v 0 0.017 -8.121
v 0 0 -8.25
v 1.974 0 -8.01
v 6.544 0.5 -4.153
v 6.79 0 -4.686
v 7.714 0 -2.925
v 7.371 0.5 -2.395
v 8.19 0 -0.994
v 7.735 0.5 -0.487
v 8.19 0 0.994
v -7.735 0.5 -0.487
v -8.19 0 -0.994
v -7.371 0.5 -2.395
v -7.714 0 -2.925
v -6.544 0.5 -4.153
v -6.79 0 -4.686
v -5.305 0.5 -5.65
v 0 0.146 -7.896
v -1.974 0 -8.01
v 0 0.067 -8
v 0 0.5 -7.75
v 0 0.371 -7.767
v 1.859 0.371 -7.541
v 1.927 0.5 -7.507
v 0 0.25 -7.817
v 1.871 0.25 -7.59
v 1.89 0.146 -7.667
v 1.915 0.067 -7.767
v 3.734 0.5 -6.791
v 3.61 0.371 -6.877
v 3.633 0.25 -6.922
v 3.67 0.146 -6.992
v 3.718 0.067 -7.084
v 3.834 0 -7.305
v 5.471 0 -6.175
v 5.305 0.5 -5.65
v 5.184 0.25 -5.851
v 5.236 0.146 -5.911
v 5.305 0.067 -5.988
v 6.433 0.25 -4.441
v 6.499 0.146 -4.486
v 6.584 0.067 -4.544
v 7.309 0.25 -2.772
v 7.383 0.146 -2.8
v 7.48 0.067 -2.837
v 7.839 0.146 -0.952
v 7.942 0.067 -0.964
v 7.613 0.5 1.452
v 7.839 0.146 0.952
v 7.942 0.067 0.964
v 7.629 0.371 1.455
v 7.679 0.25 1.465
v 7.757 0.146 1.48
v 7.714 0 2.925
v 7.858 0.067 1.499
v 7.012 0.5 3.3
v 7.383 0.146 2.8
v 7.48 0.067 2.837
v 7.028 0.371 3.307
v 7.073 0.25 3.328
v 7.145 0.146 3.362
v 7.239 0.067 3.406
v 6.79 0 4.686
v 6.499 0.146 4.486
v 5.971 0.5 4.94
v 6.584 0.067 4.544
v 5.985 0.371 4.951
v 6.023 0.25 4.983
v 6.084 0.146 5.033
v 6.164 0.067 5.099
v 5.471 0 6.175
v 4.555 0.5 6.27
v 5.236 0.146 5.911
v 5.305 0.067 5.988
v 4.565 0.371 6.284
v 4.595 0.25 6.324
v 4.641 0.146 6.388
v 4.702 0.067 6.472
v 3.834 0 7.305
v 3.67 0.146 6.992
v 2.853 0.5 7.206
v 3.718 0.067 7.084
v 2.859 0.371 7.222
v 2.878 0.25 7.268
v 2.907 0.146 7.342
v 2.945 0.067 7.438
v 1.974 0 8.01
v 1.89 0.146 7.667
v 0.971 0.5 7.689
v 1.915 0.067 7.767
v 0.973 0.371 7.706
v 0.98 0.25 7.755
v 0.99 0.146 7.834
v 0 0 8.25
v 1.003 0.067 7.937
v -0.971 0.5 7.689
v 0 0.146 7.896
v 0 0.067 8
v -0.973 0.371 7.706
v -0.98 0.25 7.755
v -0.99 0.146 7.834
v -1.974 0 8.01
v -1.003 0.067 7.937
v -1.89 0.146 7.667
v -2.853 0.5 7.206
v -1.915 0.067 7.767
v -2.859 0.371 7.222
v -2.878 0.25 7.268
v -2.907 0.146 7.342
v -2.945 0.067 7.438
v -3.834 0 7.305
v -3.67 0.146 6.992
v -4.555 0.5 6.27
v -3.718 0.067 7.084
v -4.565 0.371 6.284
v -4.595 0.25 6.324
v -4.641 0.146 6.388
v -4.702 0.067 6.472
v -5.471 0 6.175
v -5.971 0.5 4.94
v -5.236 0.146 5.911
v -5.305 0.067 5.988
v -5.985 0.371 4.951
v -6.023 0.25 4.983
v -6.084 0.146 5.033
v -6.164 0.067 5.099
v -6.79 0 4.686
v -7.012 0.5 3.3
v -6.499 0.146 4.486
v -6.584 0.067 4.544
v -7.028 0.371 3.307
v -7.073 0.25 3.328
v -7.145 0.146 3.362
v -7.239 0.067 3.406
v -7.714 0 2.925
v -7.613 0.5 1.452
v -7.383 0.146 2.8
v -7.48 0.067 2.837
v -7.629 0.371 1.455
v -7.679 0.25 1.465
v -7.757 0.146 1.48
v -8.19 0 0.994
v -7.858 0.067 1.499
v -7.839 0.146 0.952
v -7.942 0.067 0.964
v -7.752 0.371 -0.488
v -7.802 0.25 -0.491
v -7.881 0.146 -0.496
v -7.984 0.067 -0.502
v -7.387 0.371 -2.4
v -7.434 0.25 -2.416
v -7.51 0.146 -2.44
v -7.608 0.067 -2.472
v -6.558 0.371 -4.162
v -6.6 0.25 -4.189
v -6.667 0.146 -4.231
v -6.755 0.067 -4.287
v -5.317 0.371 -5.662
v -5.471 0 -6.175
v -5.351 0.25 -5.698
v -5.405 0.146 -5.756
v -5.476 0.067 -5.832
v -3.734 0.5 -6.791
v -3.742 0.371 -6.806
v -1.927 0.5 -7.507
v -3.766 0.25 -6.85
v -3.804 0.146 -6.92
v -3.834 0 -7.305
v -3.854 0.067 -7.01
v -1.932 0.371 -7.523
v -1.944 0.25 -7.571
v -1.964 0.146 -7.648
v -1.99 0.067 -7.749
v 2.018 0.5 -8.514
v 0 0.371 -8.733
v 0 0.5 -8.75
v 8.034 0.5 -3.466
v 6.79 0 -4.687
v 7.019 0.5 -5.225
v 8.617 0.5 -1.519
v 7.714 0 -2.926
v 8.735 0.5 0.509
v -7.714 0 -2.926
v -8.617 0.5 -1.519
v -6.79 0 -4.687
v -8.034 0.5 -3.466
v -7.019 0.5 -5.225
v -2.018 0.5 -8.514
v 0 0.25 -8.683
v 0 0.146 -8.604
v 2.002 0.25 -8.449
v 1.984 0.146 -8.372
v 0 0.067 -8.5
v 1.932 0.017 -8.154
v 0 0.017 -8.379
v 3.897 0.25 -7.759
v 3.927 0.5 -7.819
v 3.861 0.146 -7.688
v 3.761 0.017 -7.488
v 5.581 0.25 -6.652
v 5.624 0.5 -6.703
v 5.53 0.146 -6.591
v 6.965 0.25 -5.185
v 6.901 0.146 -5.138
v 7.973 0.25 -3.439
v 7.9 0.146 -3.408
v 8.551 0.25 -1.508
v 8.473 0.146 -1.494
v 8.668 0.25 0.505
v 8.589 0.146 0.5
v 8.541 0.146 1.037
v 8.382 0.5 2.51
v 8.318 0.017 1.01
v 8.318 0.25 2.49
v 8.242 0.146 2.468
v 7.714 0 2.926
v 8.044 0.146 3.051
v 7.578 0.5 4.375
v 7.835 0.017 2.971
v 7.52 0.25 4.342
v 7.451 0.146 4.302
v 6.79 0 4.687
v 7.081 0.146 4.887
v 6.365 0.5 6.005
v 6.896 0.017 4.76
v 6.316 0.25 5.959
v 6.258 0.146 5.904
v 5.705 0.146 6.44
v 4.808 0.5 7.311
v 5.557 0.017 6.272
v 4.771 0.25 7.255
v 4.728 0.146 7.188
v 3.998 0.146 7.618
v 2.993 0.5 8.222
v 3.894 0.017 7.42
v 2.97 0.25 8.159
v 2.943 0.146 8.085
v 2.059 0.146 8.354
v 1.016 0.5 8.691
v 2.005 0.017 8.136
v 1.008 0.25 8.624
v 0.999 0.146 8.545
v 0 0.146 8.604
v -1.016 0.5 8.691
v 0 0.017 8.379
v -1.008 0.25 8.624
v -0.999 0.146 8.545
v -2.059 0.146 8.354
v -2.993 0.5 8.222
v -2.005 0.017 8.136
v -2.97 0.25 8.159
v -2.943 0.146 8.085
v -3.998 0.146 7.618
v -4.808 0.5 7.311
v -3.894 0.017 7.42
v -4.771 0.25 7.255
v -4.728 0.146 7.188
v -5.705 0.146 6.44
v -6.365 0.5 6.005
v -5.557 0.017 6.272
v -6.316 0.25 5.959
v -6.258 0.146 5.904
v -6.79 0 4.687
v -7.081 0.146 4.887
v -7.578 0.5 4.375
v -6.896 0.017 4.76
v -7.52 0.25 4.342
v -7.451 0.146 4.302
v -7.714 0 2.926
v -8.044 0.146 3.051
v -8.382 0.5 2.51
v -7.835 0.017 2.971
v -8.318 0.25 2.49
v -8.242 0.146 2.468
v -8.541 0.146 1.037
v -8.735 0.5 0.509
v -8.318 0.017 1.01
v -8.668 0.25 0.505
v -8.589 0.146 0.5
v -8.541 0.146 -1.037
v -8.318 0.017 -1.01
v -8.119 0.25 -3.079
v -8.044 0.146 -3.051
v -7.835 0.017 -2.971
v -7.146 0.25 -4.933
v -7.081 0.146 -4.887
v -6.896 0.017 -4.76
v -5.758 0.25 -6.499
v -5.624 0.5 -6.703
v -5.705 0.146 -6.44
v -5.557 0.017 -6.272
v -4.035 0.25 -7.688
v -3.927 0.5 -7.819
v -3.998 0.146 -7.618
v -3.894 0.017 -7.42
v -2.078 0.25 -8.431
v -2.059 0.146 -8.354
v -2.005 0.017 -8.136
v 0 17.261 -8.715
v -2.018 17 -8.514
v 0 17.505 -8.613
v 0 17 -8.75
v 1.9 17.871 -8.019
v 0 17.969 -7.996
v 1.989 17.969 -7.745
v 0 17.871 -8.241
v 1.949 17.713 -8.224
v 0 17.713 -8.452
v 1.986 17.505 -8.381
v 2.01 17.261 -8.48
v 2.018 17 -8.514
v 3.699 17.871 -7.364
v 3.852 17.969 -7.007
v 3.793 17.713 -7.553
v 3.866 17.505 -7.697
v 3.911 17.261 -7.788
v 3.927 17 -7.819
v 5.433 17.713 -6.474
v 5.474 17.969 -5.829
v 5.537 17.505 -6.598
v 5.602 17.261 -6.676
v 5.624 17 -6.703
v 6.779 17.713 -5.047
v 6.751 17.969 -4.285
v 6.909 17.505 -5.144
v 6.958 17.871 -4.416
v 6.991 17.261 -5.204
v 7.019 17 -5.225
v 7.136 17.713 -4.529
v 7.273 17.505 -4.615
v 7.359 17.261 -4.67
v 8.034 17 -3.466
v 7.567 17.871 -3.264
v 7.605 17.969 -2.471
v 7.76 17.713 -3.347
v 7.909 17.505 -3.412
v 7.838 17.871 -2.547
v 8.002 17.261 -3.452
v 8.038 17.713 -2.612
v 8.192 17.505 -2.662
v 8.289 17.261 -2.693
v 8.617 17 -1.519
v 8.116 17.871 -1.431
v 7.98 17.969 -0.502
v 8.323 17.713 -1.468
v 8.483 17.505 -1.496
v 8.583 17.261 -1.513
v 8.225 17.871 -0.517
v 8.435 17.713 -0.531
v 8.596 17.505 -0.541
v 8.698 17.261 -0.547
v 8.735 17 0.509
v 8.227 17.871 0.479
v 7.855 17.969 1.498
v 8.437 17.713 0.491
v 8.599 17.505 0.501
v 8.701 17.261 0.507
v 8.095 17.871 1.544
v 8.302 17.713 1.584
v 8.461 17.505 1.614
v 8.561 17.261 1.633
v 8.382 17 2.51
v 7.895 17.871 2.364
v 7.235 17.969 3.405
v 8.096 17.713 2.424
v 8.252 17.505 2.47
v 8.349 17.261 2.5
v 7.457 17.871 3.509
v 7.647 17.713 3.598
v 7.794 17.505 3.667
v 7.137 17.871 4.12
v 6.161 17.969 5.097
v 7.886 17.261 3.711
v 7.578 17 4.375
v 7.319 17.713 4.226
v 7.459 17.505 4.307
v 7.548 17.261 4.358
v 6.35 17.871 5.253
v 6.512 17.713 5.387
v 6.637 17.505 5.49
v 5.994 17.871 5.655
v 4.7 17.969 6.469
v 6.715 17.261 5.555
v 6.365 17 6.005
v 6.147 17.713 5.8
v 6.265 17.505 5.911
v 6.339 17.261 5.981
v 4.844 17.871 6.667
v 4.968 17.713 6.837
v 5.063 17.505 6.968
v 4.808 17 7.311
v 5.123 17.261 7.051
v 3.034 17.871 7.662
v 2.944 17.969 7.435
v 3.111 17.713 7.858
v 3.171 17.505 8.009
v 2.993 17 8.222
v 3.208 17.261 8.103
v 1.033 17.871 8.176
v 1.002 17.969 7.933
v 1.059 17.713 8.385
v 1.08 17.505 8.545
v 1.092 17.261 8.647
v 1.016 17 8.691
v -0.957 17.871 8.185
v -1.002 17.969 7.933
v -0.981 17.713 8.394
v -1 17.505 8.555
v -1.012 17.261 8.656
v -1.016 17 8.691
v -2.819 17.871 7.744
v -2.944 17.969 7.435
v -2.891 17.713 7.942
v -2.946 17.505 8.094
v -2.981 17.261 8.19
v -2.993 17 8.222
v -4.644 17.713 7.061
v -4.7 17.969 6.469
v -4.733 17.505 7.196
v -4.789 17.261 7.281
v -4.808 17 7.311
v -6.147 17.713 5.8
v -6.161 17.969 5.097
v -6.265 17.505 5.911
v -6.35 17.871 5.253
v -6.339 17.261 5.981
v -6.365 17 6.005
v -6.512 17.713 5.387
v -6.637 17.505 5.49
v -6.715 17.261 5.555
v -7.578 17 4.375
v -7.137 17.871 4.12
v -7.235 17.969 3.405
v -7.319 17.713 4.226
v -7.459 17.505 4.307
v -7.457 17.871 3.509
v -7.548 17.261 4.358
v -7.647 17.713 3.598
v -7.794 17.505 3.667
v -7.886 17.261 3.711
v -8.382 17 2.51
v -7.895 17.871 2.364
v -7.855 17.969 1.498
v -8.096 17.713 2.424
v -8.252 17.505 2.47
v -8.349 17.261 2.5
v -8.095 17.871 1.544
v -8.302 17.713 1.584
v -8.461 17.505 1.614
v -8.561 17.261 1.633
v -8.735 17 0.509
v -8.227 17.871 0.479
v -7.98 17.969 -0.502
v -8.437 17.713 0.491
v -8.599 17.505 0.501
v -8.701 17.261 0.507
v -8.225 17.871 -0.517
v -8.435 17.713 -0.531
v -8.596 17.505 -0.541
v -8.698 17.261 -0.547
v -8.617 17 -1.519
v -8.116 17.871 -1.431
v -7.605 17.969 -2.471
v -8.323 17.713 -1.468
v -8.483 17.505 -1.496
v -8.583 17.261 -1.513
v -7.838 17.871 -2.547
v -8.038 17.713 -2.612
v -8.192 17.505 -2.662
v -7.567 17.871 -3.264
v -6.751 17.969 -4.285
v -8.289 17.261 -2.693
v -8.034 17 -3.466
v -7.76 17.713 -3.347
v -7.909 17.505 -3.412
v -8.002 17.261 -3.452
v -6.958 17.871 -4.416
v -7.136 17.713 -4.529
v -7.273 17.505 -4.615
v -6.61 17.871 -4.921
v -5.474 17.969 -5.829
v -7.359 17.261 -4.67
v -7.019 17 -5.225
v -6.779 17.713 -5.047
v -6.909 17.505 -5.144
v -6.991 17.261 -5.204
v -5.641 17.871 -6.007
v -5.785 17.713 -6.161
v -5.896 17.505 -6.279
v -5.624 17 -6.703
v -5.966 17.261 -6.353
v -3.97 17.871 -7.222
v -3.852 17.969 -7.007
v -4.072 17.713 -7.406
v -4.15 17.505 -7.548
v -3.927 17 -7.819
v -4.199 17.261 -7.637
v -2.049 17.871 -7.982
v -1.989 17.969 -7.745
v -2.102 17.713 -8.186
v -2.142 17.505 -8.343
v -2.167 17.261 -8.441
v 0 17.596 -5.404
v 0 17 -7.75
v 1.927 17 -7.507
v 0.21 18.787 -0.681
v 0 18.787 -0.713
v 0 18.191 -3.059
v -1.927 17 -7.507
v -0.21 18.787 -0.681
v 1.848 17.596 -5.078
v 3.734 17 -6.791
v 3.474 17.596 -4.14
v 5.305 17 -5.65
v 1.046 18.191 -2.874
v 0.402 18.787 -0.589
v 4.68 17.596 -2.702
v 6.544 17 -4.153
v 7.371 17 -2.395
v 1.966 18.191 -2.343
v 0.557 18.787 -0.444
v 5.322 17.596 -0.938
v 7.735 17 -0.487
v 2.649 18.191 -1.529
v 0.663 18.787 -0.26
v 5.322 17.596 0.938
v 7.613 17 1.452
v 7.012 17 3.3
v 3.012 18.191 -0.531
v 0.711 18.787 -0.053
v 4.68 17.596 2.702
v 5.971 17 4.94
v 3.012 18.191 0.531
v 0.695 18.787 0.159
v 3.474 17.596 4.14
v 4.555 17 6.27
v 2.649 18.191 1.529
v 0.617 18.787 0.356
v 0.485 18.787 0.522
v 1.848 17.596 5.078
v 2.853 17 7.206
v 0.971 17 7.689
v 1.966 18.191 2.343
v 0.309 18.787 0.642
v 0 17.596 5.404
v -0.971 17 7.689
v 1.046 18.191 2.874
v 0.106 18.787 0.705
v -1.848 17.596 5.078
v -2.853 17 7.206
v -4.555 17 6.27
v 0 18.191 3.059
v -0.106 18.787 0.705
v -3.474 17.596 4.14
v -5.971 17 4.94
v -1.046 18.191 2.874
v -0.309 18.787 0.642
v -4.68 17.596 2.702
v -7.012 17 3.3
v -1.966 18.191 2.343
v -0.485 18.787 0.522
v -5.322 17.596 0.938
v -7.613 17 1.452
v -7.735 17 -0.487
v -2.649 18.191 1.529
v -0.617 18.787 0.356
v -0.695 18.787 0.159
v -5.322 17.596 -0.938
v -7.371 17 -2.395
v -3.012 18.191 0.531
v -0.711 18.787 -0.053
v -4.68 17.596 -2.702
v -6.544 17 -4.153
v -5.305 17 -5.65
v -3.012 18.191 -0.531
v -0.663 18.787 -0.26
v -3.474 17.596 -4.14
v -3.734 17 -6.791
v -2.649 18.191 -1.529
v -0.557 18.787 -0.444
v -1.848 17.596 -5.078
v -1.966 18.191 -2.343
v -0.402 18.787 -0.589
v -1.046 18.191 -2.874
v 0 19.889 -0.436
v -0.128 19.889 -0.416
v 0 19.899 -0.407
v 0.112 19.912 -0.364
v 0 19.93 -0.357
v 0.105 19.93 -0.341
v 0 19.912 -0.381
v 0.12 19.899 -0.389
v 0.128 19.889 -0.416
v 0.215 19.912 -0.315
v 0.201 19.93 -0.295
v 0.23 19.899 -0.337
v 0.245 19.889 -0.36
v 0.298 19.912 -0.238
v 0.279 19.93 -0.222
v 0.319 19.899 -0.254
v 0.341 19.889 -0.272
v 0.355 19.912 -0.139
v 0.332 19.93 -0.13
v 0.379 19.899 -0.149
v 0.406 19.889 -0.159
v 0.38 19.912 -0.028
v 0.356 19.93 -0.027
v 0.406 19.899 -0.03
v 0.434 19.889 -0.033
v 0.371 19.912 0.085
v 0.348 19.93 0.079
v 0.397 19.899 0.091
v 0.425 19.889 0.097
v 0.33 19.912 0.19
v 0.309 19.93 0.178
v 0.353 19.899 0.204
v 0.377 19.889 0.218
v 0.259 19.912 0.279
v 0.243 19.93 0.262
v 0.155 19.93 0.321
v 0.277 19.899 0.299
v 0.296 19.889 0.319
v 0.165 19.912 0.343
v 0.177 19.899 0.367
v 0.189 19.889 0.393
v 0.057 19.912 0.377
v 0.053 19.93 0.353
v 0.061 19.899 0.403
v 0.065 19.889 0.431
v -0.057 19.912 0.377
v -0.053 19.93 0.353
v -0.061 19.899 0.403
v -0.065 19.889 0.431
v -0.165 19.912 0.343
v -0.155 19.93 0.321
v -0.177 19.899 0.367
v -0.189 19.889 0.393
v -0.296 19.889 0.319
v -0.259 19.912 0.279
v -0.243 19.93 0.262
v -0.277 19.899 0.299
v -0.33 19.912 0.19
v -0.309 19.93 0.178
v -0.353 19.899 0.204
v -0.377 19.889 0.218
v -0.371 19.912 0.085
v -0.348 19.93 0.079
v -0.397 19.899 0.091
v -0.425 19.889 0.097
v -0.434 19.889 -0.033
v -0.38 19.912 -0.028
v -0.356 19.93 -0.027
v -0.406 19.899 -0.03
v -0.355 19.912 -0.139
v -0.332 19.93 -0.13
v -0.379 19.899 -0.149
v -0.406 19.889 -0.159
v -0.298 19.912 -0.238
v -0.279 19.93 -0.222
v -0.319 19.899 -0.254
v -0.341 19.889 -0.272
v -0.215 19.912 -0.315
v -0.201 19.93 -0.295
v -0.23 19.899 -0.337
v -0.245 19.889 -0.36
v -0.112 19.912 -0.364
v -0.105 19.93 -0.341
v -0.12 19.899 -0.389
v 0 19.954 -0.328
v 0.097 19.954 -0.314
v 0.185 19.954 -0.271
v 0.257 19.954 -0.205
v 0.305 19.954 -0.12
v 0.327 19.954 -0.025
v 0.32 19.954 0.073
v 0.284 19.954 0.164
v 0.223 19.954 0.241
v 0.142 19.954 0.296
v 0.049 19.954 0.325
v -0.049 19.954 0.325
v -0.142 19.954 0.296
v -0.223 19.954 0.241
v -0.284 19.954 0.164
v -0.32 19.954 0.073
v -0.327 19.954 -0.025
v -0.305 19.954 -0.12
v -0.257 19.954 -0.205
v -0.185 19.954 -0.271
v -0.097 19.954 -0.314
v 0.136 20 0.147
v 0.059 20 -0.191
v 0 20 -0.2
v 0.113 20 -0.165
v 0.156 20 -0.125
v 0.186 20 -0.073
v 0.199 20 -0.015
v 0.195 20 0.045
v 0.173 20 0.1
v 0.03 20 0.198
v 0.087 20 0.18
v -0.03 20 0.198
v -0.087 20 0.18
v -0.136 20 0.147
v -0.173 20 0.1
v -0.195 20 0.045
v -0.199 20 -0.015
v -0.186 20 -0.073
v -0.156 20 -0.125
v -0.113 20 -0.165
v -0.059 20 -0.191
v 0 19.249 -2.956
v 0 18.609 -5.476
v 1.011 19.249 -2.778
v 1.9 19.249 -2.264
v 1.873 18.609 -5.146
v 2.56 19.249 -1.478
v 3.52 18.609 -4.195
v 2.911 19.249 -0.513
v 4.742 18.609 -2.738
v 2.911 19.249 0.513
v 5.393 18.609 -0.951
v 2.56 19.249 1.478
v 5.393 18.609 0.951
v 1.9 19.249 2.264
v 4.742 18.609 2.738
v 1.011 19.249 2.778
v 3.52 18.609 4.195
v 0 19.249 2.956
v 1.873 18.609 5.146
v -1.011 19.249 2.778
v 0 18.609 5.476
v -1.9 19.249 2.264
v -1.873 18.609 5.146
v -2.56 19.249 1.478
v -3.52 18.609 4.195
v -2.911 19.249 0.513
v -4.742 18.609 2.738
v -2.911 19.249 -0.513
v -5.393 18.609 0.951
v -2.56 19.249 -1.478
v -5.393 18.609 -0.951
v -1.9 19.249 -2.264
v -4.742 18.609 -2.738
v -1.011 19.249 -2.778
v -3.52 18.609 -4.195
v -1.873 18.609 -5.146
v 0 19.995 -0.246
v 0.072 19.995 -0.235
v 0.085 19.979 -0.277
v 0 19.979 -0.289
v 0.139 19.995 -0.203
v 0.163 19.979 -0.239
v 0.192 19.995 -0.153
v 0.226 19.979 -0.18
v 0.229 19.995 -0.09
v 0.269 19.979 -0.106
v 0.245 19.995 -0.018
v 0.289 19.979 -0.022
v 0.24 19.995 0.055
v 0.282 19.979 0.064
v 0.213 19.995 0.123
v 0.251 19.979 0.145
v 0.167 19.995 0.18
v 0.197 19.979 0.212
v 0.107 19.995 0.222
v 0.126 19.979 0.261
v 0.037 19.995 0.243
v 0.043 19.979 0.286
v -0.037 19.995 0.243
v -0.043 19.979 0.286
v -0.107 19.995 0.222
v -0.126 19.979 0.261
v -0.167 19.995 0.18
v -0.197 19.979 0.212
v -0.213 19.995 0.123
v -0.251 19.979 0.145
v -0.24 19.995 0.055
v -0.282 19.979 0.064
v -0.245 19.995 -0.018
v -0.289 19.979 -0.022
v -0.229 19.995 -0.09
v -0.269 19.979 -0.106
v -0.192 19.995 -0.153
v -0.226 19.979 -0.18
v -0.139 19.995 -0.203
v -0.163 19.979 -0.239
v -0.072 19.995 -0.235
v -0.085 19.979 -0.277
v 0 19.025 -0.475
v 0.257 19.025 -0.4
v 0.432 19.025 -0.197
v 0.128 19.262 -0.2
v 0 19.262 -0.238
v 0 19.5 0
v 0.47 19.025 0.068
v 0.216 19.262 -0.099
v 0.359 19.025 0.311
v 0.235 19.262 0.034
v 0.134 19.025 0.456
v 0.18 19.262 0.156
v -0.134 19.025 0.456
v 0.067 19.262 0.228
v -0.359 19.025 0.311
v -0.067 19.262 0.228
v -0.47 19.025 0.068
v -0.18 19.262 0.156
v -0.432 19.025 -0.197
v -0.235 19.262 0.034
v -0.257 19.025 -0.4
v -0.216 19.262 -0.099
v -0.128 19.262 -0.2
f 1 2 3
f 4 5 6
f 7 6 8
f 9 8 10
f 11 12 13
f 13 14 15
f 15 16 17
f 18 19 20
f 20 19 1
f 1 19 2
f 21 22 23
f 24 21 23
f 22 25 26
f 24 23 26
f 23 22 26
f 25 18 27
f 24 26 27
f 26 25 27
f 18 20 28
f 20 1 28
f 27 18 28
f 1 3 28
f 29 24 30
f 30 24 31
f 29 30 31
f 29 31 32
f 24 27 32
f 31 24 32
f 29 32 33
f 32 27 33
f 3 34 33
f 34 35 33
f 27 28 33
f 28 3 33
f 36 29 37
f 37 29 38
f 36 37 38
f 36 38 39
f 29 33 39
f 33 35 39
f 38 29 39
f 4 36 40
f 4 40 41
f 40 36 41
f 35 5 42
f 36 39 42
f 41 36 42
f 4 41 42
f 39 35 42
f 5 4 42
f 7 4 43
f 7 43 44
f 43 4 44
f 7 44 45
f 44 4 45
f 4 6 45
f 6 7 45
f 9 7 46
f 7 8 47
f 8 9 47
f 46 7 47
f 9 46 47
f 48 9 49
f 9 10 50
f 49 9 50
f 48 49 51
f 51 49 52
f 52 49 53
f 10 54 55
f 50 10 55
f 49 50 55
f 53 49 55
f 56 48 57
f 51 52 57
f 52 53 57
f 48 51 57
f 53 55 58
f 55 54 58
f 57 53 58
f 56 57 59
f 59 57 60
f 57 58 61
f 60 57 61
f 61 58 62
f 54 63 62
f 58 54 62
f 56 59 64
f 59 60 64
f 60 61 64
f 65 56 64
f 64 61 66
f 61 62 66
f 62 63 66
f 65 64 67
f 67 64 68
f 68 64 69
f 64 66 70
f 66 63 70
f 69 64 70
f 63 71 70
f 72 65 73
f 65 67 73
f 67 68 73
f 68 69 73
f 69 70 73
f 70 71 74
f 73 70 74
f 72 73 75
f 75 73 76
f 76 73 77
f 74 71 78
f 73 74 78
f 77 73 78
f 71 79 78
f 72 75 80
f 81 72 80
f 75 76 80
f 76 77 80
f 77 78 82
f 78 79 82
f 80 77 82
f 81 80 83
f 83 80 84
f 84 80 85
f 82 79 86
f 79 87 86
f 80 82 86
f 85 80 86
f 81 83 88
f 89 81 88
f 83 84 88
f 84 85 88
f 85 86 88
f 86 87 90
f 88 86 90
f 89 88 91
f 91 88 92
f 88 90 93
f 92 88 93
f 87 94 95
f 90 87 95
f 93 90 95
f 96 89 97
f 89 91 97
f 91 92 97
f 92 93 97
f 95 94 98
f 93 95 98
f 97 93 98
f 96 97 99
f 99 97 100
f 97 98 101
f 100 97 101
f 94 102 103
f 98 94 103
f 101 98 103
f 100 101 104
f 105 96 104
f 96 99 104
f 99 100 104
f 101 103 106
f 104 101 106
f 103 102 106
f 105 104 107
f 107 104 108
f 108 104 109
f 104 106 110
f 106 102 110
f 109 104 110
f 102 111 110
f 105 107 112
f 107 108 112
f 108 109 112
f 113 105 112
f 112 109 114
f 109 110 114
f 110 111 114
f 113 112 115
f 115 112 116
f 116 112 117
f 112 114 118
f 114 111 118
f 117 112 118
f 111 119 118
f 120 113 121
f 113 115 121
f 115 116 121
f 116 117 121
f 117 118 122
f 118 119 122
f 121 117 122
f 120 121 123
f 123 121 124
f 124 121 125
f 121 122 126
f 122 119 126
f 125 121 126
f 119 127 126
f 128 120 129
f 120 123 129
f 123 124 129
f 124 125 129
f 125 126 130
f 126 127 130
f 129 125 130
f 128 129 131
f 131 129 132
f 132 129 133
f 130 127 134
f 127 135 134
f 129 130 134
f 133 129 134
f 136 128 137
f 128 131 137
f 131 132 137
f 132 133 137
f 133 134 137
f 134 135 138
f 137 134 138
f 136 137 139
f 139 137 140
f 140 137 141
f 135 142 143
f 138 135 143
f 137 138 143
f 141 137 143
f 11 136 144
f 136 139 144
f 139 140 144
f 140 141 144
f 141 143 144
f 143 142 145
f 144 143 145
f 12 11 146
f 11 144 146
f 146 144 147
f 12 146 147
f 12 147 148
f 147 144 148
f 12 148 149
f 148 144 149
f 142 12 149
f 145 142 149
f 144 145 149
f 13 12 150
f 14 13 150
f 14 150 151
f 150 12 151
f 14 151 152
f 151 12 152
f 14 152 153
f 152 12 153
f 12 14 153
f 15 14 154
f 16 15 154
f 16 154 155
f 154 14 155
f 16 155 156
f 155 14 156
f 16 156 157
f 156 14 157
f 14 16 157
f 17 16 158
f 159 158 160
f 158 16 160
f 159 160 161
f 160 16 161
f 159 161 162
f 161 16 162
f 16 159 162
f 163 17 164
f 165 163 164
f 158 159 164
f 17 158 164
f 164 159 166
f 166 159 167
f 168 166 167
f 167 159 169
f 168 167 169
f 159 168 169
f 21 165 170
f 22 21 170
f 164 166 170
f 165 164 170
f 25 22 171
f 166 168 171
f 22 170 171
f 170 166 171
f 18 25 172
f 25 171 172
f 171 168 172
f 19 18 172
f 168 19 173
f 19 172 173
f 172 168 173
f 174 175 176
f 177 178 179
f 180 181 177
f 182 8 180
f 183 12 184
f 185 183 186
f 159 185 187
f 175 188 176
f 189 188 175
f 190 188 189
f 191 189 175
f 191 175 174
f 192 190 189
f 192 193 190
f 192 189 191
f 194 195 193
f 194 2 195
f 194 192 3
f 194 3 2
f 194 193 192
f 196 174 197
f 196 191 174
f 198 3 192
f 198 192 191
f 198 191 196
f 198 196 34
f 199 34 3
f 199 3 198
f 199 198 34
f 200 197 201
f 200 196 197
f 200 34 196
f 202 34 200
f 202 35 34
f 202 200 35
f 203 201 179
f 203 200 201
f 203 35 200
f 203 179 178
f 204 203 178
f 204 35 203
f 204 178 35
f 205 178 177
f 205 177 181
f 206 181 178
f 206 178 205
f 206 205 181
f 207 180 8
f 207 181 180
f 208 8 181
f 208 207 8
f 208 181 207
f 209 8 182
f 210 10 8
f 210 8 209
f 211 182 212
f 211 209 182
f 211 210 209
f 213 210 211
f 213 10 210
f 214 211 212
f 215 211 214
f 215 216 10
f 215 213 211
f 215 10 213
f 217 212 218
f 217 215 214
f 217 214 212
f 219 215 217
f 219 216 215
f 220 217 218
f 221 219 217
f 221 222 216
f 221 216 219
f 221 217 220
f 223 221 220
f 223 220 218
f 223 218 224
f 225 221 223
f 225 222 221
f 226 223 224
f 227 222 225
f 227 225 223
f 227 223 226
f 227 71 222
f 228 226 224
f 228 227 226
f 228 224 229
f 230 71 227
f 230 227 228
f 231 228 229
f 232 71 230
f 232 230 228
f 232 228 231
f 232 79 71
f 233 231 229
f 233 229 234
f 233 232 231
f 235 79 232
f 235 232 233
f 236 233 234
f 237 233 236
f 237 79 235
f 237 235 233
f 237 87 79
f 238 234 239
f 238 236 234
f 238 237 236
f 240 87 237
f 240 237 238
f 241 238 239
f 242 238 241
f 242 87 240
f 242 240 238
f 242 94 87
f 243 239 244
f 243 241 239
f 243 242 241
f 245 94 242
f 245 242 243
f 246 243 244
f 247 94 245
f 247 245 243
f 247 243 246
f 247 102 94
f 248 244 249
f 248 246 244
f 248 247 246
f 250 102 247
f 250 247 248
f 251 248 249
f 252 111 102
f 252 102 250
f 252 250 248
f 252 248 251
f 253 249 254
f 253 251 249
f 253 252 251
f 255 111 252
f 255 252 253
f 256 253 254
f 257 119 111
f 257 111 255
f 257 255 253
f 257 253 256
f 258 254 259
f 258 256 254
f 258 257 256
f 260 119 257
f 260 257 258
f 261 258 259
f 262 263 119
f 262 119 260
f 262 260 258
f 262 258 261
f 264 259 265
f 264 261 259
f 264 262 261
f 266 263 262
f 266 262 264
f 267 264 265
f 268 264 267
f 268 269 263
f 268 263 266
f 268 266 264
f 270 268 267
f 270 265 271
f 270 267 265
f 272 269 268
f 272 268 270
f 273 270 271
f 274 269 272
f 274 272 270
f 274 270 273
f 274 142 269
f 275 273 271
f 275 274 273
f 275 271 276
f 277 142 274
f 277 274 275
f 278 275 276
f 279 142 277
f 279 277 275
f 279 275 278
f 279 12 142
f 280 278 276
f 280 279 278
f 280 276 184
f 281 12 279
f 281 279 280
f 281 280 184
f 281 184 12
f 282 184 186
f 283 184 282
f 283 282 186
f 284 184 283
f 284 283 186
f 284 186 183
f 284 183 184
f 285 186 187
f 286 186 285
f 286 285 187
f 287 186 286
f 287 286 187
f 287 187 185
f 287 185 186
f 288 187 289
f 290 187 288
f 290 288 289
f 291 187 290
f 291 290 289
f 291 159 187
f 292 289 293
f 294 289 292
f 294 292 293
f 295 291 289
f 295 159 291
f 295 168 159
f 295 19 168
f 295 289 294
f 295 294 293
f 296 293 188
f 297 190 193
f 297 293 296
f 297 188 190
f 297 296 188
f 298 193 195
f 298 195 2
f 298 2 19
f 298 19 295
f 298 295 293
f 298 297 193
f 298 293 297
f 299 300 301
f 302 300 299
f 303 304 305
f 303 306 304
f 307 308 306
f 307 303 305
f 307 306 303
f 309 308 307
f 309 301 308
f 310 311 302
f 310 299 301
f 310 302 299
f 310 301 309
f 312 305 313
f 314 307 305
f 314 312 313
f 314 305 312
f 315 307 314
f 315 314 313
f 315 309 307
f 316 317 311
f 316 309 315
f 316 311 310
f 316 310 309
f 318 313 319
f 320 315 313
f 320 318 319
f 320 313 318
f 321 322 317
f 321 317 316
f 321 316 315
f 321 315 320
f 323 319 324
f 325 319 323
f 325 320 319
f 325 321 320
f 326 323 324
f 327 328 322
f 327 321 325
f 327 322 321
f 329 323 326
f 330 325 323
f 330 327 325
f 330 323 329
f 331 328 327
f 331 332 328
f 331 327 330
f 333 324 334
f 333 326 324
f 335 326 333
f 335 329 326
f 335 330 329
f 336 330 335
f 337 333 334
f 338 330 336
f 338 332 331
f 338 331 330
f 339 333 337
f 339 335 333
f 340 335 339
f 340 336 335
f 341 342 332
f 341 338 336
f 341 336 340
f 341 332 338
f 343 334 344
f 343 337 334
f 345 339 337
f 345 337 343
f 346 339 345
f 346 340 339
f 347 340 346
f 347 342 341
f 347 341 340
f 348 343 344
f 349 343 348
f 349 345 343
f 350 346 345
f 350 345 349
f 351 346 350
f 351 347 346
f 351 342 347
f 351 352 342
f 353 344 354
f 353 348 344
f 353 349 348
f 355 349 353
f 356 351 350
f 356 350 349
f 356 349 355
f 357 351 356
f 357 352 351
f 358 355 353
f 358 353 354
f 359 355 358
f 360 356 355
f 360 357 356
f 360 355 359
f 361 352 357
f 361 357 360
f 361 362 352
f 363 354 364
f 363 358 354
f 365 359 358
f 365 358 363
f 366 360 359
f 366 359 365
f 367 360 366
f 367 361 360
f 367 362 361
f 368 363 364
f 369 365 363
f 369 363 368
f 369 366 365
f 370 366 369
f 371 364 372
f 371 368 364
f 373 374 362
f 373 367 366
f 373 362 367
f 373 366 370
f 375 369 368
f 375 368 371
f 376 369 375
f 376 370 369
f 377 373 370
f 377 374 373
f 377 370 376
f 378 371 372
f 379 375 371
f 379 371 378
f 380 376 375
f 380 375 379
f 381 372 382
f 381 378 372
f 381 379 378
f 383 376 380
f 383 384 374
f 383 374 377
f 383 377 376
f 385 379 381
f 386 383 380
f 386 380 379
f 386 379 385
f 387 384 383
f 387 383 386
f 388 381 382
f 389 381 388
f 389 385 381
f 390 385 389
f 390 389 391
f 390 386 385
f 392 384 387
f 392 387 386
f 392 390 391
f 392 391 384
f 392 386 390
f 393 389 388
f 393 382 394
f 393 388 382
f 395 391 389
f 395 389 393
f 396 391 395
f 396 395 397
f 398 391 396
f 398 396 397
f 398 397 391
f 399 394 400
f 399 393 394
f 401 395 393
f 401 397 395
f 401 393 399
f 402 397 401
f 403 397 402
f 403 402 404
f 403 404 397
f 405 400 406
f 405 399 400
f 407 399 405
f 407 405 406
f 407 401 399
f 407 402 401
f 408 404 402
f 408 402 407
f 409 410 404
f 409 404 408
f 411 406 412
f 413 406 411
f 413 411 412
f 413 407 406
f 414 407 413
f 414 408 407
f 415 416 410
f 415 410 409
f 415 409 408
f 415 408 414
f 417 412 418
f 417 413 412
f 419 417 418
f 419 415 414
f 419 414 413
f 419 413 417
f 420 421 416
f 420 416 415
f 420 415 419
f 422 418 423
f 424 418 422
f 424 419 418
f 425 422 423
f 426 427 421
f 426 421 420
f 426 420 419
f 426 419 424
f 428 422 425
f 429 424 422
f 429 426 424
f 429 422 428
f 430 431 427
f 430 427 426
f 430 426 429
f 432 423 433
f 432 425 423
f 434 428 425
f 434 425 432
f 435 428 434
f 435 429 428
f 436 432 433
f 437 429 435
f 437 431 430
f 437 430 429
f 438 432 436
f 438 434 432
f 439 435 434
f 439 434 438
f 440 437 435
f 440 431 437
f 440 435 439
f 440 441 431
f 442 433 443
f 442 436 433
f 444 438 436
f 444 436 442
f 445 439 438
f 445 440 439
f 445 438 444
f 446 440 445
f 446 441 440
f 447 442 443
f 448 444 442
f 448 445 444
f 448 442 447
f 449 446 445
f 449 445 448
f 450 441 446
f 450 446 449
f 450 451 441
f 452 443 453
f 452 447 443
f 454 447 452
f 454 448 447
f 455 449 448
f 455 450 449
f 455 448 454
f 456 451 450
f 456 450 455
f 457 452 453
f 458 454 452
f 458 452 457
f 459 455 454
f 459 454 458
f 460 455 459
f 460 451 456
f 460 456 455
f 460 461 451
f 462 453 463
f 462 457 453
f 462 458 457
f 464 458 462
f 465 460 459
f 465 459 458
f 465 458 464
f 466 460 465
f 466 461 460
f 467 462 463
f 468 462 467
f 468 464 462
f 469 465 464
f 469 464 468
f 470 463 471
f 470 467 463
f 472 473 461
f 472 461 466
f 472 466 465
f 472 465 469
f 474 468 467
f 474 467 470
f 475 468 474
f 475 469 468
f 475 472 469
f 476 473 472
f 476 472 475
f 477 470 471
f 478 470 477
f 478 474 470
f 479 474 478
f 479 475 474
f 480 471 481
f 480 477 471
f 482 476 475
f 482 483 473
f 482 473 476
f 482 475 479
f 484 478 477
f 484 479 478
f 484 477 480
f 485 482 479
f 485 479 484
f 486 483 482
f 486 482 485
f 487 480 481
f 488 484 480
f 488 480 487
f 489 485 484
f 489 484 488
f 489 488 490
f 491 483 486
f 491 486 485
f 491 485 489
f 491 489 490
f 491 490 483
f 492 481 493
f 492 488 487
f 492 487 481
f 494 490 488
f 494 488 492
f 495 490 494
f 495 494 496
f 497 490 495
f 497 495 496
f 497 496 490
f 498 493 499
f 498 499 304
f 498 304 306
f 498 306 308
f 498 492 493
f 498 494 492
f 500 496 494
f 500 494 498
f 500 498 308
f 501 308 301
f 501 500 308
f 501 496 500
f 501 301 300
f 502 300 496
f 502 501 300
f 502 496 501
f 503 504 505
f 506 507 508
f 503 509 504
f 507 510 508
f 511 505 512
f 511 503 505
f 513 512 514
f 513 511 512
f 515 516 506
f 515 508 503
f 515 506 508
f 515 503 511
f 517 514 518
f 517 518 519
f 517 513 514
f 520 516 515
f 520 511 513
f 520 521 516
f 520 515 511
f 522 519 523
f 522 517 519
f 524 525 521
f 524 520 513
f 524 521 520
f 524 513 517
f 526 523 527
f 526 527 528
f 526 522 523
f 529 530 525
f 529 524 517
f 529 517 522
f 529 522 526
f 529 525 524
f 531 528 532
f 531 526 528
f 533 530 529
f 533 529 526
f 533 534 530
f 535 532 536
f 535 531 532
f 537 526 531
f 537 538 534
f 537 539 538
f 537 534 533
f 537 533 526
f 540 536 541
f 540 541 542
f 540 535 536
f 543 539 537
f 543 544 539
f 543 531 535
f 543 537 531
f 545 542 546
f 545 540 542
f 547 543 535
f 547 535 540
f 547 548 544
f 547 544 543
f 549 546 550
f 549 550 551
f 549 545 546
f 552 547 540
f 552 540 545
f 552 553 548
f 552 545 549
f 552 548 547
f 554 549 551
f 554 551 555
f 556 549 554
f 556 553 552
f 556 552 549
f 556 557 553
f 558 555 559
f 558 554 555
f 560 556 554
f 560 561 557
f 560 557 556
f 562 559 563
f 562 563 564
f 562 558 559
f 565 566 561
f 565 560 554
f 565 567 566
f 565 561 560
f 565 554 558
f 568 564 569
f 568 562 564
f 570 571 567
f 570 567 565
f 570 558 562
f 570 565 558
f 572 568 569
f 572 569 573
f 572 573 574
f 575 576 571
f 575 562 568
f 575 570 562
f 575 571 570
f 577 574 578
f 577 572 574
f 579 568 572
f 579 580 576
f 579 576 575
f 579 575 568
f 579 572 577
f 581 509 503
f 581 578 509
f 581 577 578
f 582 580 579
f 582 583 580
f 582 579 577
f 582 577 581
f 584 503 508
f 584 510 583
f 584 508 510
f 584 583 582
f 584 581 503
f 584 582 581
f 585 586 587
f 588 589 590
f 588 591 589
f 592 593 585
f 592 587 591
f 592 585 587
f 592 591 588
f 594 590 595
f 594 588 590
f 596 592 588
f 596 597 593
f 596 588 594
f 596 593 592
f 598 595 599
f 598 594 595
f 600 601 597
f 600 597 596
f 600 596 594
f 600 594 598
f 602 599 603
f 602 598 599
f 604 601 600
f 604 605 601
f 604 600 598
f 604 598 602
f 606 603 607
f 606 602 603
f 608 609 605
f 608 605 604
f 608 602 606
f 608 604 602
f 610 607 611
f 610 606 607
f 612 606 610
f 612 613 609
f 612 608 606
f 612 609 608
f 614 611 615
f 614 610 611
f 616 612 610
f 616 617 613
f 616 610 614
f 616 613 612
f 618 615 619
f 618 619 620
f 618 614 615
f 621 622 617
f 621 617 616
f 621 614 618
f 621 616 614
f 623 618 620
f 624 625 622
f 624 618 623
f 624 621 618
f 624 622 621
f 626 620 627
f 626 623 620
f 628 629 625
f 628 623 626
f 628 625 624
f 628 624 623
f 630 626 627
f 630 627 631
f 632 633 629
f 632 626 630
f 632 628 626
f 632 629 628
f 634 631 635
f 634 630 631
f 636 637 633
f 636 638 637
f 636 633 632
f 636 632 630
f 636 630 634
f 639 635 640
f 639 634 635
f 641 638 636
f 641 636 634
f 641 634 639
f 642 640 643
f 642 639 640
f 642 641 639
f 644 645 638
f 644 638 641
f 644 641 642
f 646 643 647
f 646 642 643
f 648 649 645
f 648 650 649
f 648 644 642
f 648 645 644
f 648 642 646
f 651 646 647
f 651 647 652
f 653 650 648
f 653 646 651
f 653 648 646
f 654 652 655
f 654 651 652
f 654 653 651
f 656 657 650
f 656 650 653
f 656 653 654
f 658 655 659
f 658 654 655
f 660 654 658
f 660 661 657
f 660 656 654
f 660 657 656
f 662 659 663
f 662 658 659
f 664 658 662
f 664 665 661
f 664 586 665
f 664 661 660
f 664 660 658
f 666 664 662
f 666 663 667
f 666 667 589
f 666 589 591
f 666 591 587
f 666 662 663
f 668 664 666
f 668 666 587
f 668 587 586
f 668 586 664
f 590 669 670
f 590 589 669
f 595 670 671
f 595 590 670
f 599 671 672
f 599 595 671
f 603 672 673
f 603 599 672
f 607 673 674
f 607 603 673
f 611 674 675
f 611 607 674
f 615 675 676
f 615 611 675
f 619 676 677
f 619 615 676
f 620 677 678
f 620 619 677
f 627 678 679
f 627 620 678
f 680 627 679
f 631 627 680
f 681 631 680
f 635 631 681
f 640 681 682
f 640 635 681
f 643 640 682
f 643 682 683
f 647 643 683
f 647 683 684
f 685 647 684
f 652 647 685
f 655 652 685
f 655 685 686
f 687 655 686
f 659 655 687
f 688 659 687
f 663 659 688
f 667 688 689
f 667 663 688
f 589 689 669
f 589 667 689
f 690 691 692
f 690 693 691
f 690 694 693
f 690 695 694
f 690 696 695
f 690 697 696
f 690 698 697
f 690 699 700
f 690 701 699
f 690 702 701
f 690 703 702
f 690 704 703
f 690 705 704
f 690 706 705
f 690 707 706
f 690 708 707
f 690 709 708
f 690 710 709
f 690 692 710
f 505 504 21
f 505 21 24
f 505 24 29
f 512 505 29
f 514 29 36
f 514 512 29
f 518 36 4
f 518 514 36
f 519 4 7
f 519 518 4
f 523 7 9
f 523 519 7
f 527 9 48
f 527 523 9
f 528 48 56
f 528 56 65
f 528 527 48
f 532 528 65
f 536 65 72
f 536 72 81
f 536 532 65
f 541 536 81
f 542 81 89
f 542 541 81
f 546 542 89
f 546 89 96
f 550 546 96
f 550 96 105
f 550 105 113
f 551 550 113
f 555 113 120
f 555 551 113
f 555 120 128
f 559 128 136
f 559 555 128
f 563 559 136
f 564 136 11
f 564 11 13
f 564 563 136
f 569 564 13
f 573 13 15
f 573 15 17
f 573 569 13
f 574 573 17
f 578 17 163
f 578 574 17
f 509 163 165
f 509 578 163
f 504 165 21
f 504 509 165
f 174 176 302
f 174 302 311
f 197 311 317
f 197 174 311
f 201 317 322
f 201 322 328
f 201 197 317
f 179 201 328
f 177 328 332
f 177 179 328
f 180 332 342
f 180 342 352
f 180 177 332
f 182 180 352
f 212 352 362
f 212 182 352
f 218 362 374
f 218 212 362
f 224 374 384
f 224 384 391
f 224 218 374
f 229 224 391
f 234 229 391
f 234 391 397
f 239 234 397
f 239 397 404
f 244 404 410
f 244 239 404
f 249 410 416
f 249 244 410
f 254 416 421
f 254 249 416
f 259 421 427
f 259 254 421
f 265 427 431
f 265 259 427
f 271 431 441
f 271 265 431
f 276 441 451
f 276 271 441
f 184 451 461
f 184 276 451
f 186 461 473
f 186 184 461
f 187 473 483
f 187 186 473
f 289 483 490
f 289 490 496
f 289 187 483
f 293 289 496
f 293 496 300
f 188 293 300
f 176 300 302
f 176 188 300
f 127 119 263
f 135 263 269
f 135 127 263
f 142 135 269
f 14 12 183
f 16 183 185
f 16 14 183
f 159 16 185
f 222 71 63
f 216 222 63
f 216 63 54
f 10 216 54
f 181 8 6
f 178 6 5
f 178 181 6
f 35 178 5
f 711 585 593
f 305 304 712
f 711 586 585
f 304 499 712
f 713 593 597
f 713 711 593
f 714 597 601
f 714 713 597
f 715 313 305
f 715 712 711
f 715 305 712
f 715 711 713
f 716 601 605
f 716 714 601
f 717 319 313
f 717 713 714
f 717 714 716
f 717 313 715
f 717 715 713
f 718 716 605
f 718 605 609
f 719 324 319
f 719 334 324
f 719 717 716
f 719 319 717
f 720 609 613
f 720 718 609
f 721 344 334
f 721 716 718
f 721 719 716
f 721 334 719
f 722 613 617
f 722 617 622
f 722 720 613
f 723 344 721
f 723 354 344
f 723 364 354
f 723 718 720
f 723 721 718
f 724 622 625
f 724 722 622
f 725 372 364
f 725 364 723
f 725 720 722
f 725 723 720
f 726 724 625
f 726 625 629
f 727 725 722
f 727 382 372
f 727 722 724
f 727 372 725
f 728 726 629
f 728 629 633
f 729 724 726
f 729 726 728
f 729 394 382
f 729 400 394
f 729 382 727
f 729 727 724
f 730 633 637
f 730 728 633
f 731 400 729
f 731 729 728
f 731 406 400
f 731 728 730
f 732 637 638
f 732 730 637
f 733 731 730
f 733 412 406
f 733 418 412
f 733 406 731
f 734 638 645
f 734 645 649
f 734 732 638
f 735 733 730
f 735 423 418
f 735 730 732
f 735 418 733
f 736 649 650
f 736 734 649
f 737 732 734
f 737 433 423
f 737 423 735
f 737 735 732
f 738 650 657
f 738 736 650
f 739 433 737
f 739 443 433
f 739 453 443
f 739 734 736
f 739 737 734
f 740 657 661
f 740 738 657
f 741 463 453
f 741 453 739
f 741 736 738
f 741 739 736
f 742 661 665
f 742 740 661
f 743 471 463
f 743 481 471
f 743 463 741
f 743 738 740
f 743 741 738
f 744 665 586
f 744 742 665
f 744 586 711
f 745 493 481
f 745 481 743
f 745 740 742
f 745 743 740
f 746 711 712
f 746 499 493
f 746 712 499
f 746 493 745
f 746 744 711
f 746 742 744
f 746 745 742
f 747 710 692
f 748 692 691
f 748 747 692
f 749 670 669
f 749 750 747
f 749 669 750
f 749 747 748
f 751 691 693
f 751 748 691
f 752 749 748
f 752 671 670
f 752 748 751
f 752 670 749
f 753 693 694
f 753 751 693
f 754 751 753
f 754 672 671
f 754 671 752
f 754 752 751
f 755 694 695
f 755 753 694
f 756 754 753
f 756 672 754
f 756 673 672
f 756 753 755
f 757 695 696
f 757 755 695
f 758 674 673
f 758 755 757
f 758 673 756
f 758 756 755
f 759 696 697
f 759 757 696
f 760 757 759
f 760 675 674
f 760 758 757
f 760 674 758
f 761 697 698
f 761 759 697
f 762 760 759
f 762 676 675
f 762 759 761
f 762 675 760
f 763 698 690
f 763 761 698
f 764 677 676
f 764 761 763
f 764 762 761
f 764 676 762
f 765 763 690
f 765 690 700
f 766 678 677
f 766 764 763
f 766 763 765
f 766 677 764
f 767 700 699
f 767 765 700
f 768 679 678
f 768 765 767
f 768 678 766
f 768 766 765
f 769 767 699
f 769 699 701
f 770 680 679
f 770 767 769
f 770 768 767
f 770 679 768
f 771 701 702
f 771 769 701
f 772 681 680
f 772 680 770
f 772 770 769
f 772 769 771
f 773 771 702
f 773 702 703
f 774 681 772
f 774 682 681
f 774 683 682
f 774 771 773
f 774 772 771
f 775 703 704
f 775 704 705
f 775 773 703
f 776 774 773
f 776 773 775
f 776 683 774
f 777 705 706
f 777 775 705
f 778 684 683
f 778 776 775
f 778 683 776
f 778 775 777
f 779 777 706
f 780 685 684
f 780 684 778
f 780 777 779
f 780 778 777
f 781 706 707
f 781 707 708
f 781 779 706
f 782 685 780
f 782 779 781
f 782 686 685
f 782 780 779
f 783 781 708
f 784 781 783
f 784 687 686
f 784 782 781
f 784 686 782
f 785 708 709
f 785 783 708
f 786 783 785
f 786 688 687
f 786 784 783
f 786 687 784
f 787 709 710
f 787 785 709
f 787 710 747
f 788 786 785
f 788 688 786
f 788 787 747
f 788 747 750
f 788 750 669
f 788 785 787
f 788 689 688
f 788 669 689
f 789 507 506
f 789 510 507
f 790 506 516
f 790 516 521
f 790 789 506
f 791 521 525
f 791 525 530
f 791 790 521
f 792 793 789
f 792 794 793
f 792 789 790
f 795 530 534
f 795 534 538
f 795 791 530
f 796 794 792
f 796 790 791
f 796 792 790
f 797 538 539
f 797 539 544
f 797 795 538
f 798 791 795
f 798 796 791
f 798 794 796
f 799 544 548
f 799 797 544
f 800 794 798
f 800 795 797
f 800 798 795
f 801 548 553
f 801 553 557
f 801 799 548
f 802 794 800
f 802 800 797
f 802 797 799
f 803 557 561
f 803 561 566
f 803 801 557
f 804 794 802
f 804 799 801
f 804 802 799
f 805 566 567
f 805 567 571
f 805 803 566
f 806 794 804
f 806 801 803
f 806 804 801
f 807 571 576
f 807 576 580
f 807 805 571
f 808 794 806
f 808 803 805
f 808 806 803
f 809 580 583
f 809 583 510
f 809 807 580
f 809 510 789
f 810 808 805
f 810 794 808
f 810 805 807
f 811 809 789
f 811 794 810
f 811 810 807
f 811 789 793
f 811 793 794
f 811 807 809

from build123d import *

# Parameters (mm, degrees)
FILLET1_R = 0.5


with BuildPart() as part:
    # Sketch1 → Revolve1 (revolve)
    with BuildSketch(Plane.XY, mode=Mode.PRIVATE) as revolve1_sk:
        with BuildLine():
            Line((7.75, 0), (7.75, 17))
            Line((7.75, 17), (0.712765957, 18.787234043))
            Line((0.712765957, 18.787234043), (0, 19.5))
            Line((0, 19.5), (0, 20))
            Line((0, 20), (0.2, 20))
            ThreePointArc((0.2, 20), (0.268166817, 19.988024693), (0.328170449, 19.95353285))
            Line((0.328170449, 19.95353285), (0.356771445, 19.92965651))
            ThreePointArc((0.356771445, 19.92965651), (0.393979876, 19.905071671), (0.435711125, 19.889343206))
            Line((0.435711125, 19.889343206), (7.996153846, 17.969230769))
            ThreePointArc((7.996153846, 17.969230769), (8.539352217, 17.613940614), (8.75, 17))
            Line((8.75, 17), (8.75, 0))
            Line((8.75, 0), (7.75, 0))
        make_face()
    revolve(revolve1_sk.sketch.rotate(Axis((0, 9.5, 0), (0, -1, 0)), 270), axis=Axis((0, 9.5, 0), (0, -1, 0)))

    # Fillet1
    fillet1_edges = [part.edges().sort_by_distance(p)[0] for p in [
        (0, 0, 8.75),
        (0, 0, 7.75),
    ]]
    fillet(fillet1_edges, radius=FILLET1_R - 0.0001)  # a hair under: the kernel refuses the full size


solid = part.part
